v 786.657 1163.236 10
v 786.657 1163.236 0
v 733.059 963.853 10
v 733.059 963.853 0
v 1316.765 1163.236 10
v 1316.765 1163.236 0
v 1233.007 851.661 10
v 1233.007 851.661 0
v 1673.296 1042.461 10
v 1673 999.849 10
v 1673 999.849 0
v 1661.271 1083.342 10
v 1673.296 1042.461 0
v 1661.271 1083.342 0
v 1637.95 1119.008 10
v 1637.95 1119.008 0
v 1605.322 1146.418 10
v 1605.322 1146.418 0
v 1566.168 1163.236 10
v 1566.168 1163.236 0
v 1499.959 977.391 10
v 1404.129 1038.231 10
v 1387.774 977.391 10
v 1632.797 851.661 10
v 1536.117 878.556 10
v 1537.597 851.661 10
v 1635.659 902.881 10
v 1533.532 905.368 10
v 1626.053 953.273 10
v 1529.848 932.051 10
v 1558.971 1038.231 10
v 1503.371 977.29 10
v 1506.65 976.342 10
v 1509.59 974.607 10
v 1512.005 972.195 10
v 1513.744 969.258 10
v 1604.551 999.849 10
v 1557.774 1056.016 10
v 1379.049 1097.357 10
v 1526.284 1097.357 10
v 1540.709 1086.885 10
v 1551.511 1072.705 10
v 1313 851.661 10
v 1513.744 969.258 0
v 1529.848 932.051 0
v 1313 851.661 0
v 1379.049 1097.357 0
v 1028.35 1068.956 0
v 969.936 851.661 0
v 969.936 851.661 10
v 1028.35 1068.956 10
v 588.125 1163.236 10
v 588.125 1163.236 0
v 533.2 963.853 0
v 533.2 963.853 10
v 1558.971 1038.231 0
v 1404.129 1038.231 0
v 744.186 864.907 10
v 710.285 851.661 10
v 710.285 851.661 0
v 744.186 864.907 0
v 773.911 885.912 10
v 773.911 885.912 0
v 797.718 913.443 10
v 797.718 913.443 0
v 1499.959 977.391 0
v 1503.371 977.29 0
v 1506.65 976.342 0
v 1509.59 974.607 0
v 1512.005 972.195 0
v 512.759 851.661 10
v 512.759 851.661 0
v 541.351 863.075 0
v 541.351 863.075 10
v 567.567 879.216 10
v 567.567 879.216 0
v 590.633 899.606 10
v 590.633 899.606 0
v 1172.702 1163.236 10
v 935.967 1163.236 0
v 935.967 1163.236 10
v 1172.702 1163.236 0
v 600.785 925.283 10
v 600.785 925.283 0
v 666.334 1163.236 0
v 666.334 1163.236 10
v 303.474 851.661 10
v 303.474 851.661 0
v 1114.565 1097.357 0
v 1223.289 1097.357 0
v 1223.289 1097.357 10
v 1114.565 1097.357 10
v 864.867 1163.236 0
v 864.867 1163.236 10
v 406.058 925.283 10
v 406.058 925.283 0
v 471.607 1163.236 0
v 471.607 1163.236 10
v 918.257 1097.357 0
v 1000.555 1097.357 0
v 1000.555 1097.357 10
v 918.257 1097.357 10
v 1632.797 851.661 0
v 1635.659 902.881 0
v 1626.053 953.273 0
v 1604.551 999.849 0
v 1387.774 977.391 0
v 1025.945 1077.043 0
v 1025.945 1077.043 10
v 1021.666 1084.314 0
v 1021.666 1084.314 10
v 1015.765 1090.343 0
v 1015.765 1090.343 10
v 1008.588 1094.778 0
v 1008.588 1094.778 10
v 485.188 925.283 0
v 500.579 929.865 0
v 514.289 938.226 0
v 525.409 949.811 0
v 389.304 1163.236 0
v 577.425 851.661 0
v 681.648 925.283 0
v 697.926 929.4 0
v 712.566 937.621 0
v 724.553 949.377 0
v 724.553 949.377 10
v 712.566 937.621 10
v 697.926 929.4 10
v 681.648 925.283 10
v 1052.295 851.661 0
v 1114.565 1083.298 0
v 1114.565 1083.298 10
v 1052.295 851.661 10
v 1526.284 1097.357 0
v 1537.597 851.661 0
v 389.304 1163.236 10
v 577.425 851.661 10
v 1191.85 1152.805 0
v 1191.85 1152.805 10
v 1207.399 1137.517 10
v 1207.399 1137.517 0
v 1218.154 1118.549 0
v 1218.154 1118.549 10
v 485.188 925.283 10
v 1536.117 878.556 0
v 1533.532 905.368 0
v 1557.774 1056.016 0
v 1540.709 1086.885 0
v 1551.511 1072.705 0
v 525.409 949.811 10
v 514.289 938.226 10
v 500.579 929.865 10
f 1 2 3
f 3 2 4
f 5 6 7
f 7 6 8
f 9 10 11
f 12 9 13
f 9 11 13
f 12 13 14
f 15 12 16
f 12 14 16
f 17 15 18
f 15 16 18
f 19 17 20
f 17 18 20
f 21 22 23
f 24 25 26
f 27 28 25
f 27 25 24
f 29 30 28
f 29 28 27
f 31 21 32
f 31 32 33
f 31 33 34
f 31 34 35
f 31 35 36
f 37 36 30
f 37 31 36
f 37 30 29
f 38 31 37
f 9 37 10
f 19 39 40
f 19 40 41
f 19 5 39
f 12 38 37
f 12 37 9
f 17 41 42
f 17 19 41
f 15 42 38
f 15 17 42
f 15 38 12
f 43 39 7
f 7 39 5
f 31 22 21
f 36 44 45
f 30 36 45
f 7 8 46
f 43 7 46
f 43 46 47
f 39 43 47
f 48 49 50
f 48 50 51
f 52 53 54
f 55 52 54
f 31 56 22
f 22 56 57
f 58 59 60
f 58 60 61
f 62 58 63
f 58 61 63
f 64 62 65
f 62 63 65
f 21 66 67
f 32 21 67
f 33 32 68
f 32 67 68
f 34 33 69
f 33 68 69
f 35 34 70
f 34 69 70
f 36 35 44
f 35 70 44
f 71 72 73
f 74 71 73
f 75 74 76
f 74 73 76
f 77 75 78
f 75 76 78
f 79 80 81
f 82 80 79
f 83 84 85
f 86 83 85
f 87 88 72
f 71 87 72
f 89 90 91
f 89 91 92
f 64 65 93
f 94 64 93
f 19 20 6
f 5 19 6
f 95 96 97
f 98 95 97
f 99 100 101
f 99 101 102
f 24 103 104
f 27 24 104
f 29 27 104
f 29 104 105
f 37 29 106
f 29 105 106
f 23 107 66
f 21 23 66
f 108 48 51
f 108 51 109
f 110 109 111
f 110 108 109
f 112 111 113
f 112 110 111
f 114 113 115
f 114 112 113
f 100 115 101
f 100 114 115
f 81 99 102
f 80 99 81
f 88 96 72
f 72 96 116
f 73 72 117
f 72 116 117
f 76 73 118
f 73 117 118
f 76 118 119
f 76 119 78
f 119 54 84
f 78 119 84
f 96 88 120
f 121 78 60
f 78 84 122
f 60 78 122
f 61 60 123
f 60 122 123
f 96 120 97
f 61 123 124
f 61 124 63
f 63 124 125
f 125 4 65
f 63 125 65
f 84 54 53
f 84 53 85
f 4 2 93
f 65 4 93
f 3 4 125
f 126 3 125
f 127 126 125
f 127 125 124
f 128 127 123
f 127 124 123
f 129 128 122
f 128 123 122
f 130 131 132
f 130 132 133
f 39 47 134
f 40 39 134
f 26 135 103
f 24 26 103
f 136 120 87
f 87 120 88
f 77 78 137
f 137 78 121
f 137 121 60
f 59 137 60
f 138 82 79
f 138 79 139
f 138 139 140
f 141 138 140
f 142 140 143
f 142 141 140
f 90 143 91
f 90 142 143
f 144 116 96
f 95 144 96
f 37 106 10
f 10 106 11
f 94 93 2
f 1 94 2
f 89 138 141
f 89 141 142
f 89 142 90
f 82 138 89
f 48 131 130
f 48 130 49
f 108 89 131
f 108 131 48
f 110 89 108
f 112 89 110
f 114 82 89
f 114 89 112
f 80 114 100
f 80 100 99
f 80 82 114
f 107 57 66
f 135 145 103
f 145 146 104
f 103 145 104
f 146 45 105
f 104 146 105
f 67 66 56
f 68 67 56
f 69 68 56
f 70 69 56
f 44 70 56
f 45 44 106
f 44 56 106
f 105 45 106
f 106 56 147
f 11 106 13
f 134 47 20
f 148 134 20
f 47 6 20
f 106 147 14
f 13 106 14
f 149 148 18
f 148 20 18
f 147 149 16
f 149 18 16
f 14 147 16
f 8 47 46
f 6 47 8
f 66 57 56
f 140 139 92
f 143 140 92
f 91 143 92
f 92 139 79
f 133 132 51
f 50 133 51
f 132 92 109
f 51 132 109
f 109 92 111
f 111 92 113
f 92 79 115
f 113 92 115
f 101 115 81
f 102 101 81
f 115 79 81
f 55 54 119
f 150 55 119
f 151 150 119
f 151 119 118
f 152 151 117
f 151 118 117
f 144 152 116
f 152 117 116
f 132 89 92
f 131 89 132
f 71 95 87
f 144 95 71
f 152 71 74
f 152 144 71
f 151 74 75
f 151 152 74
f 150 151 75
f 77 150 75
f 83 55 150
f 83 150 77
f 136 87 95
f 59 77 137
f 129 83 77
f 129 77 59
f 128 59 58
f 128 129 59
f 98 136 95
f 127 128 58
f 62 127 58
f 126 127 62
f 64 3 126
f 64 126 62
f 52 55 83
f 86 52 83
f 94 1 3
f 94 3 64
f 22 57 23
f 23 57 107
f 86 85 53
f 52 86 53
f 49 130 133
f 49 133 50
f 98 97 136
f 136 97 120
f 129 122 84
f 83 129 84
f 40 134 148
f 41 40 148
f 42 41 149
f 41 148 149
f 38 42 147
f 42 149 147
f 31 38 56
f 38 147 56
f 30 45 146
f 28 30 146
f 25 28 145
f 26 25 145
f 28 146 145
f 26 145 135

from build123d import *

# Parameters (mm, degrees)
EXTRUDE_1_DEPTH   = 10
EXTRUDE_1_2_DEPTH = 10
EXTRUDE_1_3_DEPTH = 10


with BuildPart() as part:
    # 草图2 → 凸台-拉伸1 (new body)
    with BuildSketch(Plane.XY):
        with BuildLine():
            Line((389.304357809, 1163.23580449), (303.474237897, 851.660711656))
            Line((303.474237897, 851.660711656), (512.758639876, 851.660711656))
            ThreePointArc((512.758639876, 851.660711656), (554.806216723, 870.581471484), (590.632848169, 899.606397847))
            Line((590.632848169, 899.606397847), (577.425168577, 851.660711656))
            Line((577.425168577, 851.660711656), (710.285491182, 851.660711656))
            ThreePointArc((710.285491182, 851.660711656), (759.686692865, 874.506623445), (797.717714769, 913.443184491))
            Line((797.717714769, 913.443184491), (864.867417156, 1163.23580449))
            Line((864.867417156, 1163.23580449), (786.65747616, 1163.23580449))
            Line((786.65747616, 1163.23580449), (733.059055058, 963.853088573))
            ThreePointArc((733.059055058, 963.853088573), (712.565608986, 937.621046524), (681.648324613, 925.283182489))
            Line((681.648324613, 925.283182489), (600.785277159, 925.283182489))
            Line((600.785277159, 925.283182489), (666.334490012, 1163.23580449))
            Line((666.334490012, 1163.23580449), (588.124549016, 1163.23580449))
            Line((588.124549016, 1163.23580449), (533.200253688, 963.853088573))
            ThreePointArc((533.200253688, 963.853088573), (514.288966473, 938.225748677), (485.187638071, 925.283182489))
            Line((485.187638071, 925.283182489), (406.057999667, 925.283182489))
            Line((406.057999667, 925.283182489), (471.60721252, 1163.23580449))
            Line((471.60721252, 1163.23580449), (389.304357809, 1163.23580449))
        make_face()
    extrude(amount=EXTRUDE_1_DEPTH)


with BuildPart() as body_2:
    # 草图2 → Extrude 1 2 (new body)
    with BuildSketch(Plane.XY):
        with BuildLine():
            Line((918.257169442, 1097.357315535), (935.966743596, 1163.23580449))
            Line((935.966743596, 1163.23580449), (1172.701909333, 1163.23580449))
            ThreePointArc((1172.701909333, 1163.23580449), (1207.399065731, 1137.517487269), (1223.288845751, 1097.357315535))
            Line((1223.288845751, 1097.357315535), (1114.564683898, 1097.357315535))
            Line((1114.564683898, 1097.357315535), (1114.564683898, 1083.298446825))
            Line((1114.564683898, 1083.298446825), (1052.295410378, 851.660711656))
            Line((1052.295410378, 851.660711656), (969.936486198, 851.660711656))
            Line((969.936486198, 851.660711656), (1028.350310788, 1068.956422133))
            ThreePointArc((1028.350310788, 1068.956422133), (1018.89847646, 1087.507686659), (1000.555319733, 1097.357315535))
            Line((1000.555319733, 1097.357315535), (918.257169442, 1097.357315535))
        make_face()
    extrude(amount=EXTRUDE_1_2_DEPTH)


with BuildPart() as body_3:
    # 草图2 → Extrude 1 3 (new body)
    with BuildSketch(Plane.XY):
        with BuildLine():
            Line((1316.764838946, 1163.23580449), (1233.006660842, 851.660711656))
            Line((1233.006660842, 851.660711656), (1313, 851.660711656))
            Line((1313, 851.660711656), (1379.04860395, 1097.357315535))
            Line((1379.04860395, 1097.357315535), (1526.283569879, 1097.357315535))
            ThreePointArc((1526.283569879, 1097.357315535), (1551.510533942, 1072.705066269), (1558.970888517, 1038.23078282))
            Line((1558.970888517, 1038.23078282), (1404.129264317, 1038.23078282))
            Line((1404.129264317, 1038.23078282), (1387.774136575, 977.390748332))
            Line((1387.774136575, 977.390748332), (1499.959107971, 977.390748332))
            ThreePointArc((1499.959107971, 977.390748332), (1508.174821309, 975.567354772), (1513.74369718, 969.257811899))
            Line((1513.74369718, 969.257811899), (1529.848203758, 932.050848425))
            ThreePointArc((1529.848203758, 932.050848425), (1534.962350336, 891.975276923), (1537.597071169, 851.660711656))
            Line((1537.597071169, 851.660711656), (1632.797442216, 851.660711656))
            ThreePointArc((1632.797442216, 851.660711656), (1632.395943132, 928.370264407), (1604.55062793, 999.848618515))
            Line((1604.55062793, 999.848618515), (1673, 999.848618515))
            ThreePointArc((1673, 999.848618515), (1650.919123277, 1102.030824802), (1566.168200806, 1163.23580449))
            Line((1566.168200806, 1163.23580449), (1316.764838946, 1163.23580449))
        make_face()
    extrude(amount=EXTRUDE_1_3_DEPTH)


solid = Compound([part.part, body_2.part, body_3.part])
